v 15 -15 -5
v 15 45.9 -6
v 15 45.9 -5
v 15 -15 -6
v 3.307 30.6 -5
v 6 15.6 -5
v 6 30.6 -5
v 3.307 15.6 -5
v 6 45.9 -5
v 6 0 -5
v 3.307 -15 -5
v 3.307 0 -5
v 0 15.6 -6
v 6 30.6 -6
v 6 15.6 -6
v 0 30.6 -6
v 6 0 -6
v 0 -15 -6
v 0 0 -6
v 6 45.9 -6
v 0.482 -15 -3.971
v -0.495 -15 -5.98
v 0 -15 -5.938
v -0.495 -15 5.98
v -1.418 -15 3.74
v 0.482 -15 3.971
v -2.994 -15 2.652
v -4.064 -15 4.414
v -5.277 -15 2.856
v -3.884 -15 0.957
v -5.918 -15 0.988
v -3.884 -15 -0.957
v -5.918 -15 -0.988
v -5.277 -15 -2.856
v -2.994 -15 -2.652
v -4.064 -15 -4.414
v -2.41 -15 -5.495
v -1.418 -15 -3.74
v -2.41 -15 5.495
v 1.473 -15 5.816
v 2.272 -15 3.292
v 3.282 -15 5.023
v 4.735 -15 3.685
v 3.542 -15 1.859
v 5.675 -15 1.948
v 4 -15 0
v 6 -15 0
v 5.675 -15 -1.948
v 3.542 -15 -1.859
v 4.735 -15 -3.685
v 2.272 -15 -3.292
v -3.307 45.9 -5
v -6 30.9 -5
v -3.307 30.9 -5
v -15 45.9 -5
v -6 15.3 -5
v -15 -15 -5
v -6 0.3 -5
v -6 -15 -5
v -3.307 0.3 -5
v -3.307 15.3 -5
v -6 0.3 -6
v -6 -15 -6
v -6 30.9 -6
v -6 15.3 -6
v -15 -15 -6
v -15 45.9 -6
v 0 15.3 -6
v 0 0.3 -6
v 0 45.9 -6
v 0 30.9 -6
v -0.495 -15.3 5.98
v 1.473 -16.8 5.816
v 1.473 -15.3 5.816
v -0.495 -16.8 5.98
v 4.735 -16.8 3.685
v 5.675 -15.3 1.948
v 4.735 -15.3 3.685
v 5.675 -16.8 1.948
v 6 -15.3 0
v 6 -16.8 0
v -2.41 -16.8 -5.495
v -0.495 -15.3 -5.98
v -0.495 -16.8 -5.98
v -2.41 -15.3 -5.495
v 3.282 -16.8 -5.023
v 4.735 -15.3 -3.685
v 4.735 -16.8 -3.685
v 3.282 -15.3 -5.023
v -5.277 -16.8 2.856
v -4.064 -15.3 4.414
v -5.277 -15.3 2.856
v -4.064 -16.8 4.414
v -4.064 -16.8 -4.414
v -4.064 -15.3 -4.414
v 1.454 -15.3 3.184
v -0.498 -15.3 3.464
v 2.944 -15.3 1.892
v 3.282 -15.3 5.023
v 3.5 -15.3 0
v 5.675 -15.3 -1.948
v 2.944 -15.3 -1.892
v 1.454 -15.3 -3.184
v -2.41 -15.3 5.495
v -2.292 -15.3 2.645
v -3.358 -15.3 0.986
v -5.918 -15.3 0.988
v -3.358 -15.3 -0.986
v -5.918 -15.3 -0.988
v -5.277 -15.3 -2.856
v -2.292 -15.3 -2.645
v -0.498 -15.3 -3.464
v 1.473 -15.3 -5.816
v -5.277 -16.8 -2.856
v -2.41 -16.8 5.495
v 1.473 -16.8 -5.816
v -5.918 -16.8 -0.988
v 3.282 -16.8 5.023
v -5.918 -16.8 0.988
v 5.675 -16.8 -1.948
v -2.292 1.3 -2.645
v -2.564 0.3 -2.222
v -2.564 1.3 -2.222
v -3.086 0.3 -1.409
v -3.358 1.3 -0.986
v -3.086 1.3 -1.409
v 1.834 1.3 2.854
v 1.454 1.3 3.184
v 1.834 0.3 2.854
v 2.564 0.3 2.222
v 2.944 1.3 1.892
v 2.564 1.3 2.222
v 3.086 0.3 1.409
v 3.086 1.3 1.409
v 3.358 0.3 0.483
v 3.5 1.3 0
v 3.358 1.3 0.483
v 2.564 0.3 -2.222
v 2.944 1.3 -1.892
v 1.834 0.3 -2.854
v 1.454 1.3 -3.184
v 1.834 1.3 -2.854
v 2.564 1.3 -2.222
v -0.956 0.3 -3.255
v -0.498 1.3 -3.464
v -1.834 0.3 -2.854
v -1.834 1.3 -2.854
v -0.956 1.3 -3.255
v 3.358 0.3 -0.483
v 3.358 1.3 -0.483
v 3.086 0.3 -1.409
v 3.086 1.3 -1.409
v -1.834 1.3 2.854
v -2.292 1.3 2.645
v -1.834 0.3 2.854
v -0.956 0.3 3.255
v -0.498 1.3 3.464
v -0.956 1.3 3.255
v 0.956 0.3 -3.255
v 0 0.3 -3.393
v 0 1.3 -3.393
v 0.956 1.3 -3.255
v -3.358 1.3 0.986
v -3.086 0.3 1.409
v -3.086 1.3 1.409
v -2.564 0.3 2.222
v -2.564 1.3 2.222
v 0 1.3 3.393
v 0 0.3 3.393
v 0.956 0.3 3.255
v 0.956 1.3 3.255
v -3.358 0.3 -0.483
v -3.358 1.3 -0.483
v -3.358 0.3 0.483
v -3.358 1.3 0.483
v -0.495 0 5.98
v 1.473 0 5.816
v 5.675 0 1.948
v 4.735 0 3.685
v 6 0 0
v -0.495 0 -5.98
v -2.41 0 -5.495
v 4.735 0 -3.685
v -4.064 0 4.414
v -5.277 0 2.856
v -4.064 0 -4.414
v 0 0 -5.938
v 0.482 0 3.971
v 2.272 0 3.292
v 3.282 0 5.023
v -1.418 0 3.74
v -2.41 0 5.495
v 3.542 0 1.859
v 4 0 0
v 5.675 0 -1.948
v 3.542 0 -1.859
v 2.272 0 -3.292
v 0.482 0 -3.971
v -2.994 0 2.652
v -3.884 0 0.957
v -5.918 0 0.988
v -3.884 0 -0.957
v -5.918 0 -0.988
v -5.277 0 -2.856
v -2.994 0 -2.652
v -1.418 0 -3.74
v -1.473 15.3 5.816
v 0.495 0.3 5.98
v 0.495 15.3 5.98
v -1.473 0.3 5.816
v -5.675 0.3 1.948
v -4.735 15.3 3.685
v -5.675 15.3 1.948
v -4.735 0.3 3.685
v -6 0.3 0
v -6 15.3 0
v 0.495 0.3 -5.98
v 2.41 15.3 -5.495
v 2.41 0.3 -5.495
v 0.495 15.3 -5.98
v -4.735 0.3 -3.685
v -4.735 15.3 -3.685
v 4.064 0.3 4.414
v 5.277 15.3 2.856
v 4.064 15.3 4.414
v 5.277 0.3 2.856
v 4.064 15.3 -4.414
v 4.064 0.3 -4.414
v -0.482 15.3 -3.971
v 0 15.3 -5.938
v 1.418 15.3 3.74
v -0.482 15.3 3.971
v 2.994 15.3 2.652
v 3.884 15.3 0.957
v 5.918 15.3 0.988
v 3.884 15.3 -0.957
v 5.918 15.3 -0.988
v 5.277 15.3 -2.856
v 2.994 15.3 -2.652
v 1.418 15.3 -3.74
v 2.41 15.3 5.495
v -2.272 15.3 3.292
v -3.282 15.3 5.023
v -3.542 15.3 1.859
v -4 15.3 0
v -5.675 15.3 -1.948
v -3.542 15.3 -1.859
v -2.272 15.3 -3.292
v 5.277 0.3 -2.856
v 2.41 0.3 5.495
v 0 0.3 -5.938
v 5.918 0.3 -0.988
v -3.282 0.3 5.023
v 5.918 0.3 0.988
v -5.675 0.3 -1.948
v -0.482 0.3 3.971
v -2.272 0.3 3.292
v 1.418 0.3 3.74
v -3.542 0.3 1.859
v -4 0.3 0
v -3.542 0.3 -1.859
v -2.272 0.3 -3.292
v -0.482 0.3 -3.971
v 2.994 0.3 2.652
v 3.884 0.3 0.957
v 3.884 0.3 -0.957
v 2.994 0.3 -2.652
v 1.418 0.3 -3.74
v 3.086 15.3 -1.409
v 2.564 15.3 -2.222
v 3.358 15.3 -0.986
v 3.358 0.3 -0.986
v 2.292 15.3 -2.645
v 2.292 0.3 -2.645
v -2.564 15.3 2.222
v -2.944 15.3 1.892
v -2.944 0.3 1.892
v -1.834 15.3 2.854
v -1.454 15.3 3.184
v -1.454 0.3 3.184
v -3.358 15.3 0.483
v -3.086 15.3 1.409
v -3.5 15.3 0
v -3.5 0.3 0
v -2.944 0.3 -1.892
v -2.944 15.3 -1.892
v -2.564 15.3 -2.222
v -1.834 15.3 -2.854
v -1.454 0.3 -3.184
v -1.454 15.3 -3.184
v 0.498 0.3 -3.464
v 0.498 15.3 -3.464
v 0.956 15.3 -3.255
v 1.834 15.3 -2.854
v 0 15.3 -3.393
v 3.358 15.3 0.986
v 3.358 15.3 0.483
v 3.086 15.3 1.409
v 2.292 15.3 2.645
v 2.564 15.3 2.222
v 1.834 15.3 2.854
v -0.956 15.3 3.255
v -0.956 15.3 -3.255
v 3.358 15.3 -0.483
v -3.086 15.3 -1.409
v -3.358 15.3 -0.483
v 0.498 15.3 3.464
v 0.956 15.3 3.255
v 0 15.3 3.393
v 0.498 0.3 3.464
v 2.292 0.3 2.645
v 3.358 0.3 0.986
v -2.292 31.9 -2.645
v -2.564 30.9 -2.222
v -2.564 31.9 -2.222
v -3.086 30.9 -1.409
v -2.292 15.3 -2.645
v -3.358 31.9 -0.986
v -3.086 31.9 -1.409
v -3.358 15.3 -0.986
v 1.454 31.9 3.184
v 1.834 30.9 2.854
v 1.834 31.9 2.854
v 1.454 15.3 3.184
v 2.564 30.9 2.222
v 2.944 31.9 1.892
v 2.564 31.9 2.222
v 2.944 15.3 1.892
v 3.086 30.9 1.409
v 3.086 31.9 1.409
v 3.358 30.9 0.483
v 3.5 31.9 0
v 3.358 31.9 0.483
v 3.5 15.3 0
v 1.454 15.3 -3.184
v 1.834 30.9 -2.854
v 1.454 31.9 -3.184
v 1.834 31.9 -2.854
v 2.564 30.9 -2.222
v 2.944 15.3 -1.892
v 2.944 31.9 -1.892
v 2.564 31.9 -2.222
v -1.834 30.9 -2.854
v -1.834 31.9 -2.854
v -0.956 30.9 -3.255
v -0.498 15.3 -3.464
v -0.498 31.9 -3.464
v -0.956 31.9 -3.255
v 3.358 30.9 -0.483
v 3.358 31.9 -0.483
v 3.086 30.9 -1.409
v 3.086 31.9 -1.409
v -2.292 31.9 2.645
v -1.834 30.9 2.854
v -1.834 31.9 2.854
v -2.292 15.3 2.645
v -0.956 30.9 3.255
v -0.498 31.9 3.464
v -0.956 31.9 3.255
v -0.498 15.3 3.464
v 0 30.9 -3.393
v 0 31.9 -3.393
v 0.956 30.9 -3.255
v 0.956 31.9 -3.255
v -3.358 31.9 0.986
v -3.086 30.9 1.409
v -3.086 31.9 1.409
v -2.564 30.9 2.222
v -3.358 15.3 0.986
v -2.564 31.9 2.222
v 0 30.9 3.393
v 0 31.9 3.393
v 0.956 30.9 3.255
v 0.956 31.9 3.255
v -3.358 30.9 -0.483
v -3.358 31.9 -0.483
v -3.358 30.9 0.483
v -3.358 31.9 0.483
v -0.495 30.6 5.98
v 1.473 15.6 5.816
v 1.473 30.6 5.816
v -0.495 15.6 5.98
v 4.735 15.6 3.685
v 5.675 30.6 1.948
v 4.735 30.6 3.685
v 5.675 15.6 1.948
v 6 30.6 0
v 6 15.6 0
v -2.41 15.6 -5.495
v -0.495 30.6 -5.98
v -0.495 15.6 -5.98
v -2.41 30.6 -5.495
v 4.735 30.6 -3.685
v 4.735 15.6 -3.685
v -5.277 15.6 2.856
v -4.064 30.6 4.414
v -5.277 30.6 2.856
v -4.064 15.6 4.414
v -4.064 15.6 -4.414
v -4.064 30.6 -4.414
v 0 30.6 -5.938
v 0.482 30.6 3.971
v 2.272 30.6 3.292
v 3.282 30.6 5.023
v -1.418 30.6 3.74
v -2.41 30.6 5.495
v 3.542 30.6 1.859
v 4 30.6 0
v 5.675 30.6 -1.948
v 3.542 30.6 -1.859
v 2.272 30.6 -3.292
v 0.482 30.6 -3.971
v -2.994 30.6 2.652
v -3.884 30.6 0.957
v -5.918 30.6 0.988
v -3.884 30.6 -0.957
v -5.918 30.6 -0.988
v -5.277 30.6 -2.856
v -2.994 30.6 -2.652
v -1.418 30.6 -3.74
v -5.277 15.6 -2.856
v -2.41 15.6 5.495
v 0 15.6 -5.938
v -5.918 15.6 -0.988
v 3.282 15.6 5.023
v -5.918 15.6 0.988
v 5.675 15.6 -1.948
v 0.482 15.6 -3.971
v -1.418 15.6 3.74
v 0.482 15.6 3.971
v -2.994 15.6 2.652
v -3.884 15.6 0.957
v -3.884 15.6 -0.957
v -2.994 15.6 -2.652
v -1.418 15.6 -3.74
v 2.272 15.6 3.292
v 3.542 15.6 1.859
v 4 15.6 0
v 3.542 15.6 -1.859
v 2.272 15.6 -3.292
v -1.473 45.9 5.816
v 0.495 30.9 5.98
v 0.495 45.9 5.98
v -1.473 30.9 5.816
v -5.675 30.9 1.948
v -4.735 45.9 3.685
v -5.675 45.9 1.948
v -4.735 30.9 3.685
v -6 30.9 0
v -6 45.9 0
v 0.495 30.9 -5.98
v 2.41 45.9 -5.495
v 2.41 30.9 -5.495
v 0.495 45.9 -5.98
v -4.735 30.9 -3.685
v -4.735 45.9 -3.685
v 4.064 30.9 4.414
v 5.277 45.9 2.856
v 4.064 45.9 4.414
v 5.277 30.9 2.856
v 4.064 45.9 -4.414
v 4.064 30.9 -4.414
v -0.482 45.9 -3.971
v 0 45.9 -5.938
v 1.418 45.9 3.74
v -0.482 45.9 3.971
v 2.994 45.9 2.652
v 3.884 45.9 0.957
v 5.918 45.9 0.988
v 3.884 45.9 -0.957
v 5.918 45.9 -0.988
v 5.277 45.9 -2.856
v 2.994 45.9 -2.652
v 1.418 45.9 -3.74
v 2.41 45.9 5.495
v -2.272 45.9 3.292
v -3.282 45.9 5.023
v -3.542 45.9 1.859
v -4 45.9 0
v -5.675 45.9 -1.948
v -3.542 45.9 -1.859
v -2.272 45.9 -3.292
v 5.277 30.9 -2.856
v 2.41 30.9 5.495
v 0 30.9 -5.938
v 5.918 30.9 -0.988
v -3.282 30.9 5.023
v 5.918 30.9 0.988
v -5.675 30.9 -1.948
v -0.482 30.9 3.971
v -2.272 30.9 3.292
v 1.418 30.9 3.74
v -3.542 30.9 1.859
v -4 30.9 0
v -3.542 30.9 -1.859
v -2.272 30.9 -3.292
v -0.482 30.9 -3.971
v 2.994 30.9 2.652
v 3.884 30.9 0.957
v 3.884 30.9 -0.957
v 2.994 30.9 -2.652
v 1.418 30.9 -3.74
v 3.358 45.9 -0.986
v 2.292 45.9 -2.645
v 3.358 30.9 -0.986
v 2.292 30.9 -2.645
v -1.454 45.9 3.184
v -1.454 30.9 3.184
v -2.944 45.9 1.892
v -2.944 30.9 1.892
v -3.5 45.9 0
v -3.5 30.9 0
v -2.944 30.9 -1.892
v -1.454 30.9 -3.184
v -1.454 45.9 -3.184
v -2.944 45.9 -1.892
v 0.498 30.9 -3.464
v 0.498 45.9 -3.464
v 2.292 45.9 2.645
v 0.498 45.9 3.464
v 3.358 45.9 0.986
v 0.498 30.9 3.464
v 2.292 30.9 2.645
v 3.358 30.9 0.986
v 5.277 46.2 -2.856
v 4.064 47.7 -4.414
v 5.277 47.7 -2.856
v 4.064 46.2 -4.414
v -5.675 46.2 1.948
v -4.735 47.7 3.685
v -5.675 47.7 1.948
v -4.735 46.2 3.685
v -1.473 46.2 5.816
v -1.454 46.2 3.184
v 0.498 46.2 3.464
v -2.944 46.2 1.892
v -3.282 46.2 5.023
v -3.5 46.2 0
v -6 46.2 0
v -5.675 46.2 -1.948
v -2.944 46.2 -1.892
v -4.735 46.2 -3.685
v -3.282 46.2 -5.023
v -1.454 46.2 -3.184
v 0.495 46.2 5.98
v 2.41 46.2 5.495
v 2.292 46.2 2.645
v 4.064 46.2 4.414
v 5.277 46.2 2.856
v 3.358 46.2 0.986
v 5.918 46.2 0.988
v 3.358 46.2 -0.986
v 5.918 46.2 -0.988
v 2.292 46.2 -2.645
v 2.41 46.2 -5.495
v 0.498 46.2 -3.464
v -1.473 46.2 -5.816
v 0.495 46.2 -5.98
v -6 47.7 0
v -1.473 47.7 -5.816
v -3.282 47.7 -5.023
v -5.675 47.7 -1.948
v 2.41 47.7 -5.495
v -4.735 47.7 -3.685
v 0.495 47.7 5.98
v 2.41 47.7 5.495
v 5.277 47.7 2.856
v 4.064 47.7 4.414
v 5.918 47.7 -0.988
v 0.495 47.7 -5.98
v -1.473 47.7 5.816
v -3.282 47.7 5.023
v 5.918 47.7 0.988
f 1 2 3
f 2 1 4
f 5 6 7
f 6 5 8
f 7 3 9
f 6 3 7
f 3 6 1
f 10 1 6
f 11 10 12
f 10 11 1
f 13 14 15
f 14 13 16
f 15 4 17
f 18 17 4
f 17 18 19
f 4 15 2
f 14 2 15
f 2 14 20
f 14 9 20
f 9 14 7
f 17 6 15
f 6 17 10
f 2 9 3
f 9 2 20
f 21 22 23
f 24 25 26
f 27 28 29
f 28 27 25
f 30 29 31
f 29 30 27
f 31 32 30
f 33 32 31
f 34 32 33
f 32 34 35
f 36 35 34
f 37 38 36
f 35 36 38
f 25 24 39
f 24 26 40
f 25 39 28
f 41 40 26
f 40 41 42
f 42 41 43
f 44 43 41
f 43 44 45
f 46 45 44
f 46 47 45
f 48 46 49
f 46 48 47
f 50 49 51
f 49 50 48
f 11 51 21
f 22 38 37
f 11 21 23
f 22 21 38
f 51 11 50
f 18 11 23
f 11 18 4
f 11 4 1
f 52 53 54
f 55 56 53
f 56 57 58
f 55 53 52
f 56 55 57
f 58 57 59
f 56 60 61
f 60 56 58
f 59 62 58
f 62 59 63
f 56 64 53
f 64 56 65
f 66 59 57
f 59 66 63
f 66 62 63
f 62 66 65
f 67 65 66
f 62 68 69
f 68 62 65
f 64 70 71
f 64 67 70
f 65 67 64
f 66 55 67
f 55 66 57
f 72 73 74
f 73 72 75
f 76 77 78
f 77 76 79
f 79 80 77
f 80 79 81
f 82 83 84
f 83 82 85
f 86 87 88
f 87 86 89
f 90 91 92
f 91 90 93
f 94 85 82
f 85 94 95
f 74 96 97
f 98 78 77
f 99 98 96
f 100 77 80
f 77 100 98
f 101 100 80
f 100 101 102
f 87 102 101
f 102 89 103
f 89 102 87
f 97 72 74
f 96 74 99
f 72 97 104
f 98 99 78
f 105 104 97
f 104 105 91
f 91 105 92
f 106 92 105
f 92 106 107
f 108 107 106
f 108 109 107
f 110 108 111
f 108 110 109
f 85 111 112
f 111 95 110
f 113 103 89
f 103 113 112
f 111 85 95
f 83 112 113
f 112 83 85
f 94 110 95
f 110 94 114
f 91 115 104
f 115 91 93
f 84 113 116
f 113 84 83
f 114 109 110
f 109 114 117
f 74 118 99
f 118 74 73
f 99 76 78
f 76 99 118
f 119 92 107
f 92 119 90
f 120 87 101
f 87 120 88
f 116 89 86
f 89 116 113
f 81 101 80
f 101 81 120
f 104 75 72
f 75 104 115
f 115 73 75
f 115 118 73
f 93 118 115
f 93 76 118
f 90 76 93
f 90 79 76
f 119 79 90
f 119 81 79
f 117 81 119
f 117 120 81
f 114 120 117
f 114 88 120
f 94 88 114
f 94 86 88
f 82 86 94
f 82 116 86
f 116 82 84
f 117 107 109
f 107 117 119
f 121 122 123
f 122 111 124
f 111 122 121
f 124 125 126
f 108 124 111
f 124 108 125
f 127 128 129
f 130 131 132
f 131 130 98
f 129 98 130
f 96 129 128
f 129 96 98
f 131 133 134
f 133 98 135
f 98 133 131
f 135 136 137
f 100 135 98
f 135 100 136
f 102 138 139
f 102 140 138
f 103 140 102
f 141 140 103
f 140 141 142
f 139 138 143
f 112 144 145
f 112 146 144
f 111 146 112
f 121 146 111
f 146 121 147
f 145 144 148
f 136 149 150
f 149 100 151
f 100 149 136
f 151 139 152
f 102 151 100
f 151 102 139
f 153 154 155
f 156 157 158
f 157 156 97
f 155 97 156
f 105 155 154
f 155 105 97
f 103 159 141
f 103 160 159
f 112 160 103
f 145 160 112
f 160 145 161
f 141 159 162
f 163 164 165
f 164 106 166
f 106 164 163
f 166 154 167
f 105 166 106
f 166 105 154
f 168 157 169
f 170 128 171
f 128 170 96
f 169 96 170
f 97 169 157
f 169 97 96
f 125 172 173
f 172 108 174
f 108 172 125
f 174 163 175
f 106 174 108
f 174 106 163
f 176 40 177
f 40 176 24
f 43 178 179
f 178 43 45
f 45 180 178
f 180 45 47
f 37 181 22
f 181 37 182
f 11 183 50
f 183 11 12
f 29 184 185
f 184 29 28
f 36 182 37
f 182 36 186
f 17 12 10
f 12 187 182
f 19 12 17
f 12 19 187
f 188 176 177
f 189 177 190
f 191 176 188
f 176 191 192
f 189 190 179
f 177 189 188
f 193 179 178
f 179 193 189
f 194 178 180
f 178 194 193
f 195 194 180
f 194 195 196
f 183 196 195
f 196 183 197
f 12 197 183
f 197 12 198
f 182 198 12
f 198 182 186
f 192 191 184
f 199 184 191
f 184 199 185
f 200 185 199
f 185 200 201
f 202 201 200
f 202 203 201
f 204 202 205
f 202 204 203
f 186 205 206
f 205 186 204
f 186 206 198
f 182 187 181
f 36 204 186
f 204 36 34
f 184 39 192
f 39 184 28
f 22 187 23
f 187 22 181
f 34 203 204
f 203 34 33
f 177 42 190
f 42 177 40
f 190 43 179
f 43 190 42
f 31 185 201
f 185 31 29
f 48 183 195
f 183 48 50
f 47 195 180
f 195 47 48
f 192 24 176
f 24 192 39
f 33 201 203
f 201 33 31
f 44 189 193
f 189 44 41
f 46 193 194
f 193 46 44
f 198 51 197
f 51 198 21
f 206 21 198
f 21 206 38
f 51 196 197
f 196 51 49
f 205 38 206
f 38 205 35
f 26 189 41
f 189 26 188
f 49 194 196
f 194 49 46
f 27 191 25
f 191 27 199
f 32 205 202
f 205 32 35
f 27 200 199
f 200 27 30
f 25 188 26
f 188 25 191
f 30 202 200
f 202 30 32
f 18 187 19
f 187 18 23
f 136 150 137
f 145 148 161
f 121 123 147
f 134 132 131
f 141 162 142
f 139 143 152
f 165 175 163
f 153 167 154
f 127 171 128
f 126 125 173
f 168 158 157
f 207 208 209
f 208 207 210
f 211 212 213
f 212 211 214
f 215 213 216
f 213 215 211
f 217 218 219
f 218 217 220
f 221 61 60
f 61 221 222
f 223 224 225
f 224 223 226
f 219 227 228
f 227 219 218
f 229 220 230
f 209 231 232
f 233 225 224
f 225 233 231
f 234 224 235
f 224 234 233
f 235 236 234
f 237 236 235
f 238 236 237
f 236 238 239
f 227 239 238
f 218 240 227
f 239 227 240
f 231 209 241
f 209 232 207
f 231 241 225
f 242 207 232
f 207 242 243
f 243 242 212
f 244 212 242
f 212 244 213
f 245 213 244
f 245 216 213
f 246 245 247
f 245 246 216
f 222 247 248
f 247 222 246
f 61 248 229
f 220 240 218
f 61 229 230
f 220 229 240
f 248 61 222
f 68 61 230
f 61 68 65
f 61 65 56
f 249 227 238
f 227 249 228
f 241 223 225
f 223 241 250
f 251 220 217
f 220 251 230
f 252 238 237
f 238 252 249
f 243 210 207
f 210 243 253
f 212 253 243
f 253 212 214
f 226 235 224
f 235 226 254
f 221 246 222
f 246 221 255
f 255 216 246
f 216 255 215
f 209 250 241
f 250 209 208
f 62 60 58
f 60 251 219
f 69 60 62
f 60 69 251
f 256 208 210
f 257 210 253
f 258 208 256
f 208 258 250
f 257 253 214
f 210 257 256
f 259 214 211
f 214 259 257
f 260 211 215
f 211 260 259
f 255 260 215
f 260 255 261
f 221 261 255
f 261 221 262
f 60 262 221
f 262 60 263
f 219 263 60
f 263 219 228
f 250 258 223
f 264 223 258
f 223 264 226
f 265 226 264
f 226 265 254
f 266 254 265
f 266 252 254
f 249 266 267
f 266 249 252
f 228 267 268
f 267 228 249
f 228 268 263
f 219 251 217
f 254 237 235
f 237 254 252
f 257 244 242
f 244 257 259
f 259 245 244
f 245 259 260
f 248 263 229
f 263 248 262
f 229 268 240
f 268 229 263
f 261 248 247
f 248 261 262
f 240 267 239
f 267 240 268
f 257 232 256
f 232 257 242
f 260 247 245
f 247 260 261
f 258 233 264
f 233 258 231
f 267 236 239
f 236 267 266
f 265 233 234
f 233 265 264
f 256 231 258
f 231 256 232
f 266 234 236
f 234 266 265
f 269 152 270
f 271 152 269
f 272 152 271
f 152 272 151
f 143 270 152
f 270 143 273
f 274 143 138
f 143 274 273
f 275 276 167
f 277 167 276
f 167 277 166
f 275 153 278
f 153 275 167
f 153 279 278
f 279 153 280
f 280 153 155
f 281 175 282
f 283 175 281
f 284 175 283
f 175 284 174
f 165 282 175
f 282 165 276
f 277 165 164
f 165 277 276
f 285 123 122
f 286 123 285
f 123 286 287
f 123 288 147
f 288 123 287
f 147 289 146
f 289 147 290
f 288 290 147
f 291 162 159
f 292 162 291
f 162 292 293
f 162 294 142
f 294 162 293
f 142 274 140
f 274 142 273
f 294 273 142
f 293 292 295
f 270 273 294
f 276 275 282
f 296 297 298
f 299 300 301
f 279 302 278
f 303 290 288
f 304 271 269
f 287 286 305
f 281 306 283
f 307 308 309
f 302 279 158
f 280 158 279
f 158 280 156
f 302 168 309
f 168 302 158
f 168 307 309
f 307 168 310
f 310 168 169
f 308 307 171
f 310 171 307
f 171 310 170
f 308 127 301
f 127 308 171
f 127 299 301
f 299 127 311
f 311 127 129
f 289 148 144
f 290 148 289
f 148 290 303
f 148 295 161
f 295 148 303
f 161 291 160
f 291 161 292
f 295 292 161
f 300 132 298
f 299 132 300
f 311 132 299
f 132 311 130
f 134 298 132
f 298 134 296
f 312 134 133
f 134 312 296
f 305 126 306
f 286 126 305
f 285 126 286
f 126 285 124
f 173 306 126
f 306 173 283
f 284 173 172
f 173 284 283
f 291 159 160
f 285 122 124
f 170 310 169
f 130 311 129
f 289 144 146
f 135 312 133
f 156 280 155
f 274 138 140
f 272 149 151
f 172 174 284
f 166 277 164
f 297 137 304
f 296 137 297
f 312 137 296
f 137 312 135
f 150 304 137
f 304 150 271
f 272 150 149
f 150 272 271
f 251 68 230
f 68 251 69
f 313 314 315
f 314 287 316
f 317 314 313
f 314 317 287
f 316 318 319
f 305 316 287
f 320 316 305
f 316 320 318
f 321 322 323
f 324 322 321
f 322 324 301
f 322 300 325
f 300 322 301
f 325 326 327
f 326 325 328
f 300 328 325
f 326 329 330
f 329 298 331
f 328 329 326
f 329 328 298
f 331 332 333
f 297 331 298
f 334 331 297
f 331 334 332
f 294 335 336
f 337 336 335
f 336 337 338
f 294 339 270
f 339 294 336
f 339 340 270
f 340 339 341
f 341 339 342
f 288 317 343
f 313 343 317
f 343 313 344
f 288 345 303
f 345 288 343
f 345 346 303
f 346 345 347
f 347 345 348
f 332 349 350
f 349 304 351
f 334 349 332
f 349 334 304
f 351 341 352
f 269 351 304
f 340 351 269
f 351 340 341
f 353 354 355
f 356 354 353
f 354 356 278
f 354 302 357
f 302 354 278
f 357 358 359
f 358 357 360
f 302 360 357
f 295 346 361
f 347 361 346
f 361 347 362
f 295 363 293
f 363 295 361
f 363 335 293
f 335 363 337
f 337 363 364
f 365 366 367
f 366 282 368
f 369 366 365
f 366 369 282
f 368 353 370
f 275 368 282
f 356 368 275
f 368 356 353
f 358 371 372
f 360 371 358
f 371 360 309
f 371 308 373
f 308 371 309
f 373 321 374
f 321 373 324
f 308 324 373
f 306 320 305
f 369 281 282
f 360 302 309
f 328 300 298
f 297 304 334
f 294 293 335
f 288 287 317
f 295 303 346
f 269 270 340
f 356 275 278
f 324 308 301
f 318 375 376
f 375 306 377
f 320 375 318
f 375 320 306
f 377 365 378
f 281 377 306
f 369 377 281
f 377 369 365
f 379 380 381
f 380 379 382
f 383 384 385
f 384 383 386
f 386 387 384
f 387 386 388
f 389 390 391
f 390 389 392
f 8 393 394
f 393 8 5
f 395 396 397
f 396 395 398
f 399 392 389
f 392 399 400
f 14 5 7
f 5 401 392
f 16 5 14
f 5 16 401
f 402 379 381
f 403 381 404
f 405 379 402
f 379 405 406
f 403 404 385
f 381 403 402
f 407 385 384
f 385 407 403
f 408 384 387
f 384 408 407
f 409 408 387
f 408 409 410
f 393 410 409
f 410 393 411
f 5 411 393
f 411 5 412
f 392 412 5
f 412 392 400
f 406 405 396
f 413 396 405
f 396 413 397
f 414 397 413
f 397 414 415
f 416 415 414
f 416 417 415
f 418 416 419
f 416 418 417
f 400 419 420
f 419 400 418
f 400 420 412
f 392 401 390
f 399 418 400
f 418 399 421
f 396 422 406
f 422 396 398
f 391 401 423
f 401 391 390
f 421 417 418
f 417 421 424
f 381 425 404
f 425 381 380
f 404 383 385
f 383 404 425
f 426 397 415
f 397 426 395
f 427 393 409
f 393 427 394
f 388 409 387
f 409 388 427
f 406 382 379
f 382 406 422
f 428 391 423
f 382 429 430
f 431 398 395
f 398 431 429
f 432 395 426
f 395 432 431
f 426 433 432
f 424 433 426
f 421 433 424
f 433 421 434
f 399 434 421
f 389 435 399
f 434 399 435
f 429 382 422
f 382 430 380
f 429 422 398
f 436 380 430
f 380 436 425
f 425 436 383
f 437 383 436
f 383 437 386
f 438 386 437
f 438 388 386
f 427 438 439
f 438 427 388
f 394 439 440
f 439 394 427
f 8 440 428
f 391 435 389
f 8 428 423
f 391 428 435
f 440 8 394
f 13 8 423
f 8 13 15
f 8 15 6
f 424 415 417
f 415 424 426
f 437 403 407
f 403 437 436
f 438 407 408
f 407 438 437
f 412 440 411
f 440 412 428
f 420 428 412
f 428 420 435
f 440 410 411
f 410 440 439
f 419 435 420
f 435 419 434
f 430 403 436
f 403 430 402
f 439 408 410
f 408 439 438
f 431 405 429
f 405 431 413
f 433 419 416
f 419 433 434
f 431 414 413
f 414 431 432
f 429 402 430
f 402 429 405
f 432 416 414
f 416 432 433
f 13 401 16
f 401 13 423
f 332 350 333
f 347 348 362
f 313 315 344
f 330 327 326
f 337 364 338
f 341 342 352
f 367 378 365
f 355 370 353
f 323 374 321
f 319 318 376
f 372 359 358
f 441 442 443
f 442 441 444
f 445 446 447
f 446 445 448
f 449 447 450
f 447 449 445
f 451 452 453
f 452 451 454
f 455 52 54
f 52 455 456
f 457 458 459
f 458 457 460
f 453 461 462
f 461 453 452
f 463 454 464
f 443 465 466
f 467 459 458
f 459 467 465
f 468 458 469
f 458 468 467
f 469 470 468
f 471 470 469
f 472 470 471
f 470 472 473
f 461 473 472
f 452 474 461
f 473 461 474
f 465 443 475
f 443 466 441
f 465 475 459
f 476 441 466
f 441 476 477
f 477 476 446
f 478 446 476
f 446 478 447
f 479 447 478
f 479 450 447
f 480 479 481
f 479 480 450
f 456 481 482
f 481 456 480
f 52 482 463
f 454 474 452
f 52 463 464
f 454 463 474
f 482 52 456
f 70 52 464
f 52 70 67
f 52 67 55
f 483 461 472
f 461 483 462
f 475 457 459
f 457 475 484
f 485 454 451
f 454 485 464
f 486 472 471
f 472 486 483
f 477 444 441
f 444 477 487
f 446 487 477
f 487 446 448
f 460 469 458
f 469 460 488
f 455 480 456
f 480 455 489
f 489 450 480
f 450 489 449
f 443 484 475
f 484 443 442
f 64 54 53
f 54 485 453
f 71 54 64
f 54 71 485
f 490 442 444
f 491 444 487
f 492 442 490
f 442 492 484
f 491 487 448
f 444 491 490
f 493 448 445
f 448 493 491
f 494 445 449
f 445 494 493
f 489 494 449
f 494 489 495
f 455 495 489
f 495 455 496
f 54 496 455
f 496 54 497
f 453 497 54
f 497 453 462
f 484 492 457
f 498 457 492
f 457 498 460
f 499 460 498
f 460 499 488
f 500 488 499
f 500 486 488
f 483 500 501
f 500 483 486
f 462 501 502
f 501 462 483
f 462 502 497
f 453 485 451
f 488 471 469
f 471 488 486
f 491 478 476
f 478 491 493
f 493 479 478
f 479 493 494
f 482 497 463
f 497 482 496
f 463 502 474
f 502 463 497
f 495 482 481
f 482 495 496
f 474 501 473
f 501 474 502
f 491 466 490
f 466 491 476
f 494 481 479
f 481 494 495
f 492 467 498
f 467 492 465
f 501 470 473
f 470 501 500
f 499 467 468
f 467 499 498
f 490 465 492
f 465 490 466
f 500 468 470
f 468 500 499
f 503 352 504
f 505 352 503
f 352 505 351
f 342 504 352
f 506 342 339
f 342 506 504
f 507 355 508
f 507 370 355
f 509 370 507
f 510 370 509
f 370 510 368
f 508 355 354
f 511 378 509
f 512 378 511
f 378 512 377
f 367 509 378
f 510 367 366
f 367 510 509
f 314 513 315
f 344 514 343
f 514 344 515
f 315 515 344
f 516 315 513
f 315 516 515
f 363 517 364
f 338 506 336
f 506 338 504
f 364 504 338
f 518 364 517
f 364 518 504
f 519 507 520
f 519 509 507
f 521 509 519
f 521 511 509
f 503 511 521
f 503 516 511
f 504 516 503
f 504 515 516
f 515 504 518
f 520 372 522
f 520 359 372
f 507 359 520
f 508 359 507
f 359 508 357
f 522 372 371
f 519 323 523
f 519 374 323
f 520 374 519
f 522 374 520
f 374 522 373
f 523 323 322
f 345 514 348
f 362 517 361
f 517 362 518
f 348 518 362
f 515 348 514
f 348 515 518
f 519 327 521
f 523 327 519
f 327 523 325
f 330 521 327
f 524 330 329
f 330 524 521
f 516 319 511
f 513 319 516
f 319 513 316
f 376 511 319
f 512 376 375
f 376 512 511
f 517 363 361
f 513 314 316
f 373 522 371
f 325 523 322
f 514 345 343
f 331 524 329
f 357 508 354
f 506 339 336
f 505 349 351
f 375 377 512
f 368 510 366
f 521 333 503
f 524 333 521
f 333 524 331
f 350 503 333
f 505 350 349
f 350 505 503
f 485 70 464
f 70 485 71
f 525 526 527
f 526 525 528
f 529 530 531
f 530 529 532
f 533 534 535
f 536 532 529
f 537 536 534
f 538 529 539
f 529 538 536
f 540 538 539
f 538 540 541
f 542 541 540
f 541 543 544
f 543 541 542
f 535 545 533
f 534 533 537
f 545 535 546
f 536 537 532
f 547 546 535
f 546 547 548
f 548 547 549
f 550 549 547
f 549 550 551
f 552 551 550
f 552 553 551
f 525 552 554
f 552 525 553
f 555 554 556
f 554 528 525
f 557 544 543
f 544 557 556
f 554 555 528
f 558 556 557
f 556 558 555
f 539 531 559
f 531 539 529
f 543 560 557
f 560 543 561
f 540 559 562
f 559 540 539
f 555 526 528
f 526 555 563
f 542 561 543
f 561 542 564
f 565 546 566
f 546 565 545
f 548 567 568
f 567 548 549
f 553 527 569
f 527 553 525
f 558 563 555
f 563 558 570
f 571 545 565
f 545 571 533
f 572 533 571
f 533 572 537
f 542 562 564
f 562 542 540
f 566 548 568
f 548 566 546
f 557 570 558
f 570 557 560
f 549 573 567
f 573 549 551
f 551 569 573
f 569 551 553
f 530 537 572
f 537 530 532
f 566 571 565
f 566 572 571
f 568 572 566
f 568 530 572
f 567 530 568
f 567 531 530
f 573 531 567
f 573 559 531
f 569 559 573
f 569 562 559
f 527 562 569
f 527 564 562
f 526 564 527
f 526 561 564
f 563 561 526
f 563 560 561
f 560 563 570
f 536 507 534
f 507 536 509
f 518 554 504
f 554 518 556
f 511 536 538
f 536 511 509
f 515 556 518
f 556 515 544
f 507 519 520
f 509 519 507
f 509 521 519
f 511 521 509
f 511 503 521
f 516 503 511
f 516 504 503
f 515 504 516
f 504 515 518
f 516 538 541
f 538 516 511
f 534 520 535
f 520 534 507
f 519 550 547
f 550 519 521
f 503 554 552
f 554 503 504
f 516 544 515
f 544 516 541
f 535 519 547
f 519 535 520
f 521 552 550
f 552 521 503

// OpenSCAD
//You can calculate the total length of the hinge with (TabLength * Number of Tabs) + (TabsTolerance * 2) + (TabLength / 5)
NumberOfTabs=4;
TabsTolerance=0.3;
TabLength=15;
//To determine the inner tolerance: OuterRadius - OuterThickness - InnerRadius
OuterRadius=6;
OuterThickness=2;
InnerRadius=3.5;
//Ideally you want TasselThickness to be equal to OuterThickness, but i left it modifiable for odd applications
TasselThickness=1;
TasselLength=15;
//If united is set to 0, the tabs will be linked together, if 1 they will be separated.
United=0;

module hingePart(partLength,outerRadius,outerThickness,innerRadius,tabWidth,tabThickness,tabLength){
    union(){
        difference(){
            rotate([90,0,0]) linear_extrude(height=partLength){
                circle(r=outerRadius);
            }
            rotate([90,0,0]) linear_extrude(height=partLength){
                circle(r=outerRadius-outerThickness);
            }
        }
        rotate([90,0,0]) linear_extrude(height=partLength){
                circle(r=innerRadius);}
        translate([(tabLength/2),-(partLength/2),-outerRadius+(tabThickness/2)]) cube([tabLength,tabWidth,tabThickness],center=true);
    }
}

module hinge(tabsNumber,tabsSpacing,partLength,outerRadius,outerThickness,innerRadius,tabThickness,tabLength,unite){
    tabWidth=partLength;
    for(a=[0:tabsNumber-1]){
        union(){if(a==0){
            if(unite==0){
                color("red",1) translate([(tabLength-((tabLength-outerRadius))),-(partLength),-outerRadius]) cube([tabLength-outerRadius,(tabWidth+tabsSpacing)*tabsNumber-tabsSpacing,tabThickness]);
                mirror(1,0,0) color("red",1) translate([(tabLength-((tabLength-outerRadius))),-(partLength),-outerRadius]) cube([tabLength-outerRadius,(tabWidth+tabsSpacing)*tabsNumber-tabsSpacing,tabThickness]);
            }
            color("blue",1) translate([0,-partLength-tabsSpacing,0]){rotate([90,0,0]) linear_extrude(height=partLength/10){
                circle(r=outerRadius);}
            color("blue",1) translate([0,tabsSpacing+1,0]){rotate([90,0,0]) linear_extrude(height=tabsSpacing+1){
                circle(r=innerRadius);}
             }
         } 
        }
        if(a%2==0){
            translate ([0,(partLength+tabsSpacing)*a,0]) hingePart(partLength,outerRadius,outerThickness,innerRadius,tabWidth,tabThickness,tabLength);
        }
        else{
            translate ([0,(partLength+tabsSpacing)*a,0]) mirror([1,0,0]) hingePart(partLength,outerRadius,outerThickness,innerRadius,tabWidth,tabThickness,tabLength);
        }
        if(a!=tabsNumber-1){
            color("red",1) translate ([0,(tabsSpacing+1+((partLength+tabsSpacing)*a)),0]) rotate([90,0,0]) linear_extrude(height=tabsSpacing+1){
                circle(r=innerRadius);} 
        }
        else{
            color("blue",1) translate([0,partLength*a+(tabsSpacing*(a+1)),0]){rotate([90,0,180]) linear_extrude(height=partLength/10){
                circle(r=outerRadius);}
            translate([0,-tabsSpacing,0]){rotate([90,0,180]) linear_extrude(height=tabsSpacing+1){
                circle(r=innerRadius);}
             }
         } 
        }
    }}
}


hinge(NumberOfTabs,TabsTolerance,TabLength,OuterRadius,OuterThickness,InnerRadius,TasselThickness,TasselLength,United);
